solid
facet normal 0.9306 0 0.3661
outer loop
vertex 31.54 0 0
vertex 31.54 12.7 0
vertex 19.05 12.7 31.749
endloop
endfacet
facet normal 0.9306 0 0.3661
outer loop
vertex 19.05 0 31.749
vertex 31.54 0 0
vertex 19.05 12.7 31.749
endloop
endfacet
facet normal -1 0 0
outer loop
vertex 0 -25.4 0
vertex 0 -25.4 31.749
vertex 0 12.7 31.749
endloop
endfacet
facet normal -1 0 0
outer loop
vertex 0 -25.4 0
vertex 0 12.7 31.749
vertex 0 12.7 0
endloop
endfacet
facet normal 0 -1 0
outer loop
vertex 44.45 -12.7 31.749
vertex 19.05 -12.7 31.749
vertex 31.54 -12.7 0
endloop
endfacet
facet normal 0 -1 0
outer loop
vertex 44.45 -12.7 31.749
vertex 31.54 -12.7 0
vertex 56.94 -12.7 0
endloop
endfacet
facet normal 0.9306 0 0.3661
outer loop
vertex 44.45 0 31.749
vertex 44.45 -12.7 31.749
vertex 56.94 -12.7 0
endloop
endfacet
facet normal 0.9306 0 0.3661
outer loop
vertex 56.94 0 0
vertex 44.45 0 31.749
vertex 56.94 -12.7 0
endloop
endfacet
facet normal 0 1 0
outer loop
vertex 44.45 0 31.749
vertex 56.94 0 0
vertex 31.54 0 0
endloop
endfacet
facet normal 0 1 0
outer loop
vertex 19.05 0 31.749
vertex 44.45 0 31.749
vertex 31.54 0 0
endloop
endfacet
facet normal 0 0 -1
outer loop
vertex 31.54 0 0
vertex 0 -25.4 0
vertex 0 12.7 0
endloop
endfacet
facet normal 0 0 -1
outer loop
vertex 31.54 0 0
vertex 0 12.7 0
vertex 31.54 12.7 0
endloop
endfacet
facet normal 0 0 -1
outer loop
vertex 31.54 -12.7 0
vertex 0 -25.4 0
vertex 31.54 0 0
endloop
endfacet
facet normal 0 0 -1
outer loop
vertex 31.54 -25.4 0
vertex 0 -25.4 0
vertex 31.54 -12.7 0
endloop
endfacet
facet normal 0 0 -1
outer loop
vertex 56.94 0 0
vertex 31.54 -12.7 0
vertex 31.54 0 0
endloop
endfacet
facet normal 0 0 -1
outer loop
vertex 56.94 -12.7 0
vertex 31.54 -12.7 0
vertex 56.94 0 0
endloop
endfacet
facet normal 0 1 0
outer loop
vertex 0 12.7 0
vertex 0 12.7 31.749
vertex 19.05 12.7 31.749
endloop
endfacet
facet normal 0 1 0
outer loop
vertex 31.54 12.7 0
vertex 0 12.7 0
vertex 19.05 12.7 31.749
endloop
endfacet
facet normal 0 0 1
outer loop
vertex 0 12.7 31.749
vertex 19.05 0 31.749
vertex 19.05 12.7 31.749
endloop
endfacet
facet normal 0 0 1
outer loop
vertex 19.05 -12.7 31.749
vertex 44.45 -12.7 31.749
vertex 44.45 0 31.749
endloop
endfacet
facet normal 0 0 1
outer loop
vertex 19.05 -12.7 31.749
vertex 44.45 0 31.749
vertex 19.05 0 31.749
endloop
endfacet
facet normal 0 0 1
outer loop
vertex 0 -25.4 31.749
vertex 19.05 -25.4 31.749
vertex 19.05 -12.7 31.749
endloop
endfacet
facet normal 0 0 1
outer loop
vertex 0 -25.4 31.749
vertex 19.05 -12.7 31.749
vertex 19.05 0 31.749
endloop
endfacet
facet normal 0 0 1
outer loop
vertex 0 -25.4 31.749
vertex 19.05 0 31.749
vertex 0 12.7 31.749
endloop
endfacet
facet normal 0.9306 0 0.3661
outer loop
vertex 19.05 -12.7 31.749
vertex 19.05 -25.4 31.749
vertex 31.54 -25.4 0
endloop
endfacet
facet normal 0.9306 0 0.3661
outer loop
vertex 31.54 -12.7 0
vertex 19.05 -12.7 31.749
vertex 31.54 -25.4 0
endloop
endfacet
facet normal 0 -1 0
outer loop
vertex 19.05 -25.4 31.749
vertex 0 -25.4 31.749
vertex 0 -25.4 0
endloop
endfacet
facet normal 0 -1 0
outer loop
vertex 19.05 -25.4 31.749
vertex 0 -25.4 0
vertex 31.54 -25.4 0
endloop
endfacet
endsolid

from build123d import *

# Parameters (mm, degrees)
F1_DEPTH = 25.4
F3_DEPTH = 38.1
F5_DEPTH = 12.7
F6_DEPTH = 12.7
F8_DEPTH = 12.7


# Not quite as in the source:
# - a length typed as a fraction of an inch, garbled in the dataset ("3 / 203.2 mm" for 3/8 in), is restored


with BuildPart() as f1:
    # F0 (on Front) → F1 (new body)
    with BuildSketch(Plane.XZ):
        Polygon((57.15, 31.7493037554), (0, 31.7493037554), (0, 0), (56.9397357658, 0), align=None)
    extrude(amount=F1_DEPTH)

    # F2 (on face) → F3 (cut)
    with BuildSketch(Plane.XZ.offset(25.4)):
        Polygon((44.45, 31.7493037554), (56.9397357658, 0), (57.15, 31.7493037554), align=None)
    extrude(amount=-F3_DEPTH, mode=Mode.SUBTRACT)

    # F4 (on face) → F5 (cut)
    with BuildSketch(Plane.XZ.offset(25.4)):
        Polygon((44.45, 31.7493037554), (19.05, 31.7493037554), (31.5397357658, 0), (56.9397357658, 0), align=None)
    extrude(amount=-F5_DEPTH, mode=Mode.SUBTRACT)

    # F6 (add): a face of the model
    f6_faces = [f1.faces().sort_by_distance(p)[0] for p in [
        (25.4756467057, 0, 15.2228100654),
    ]]
    extrude(f6_faces, amount=F6_DEPTH)

    # F7 (on face) → F8 (cut)
    with BuildSketch(Plane(origin=(0, 12.7, 0), x_dir=(-1, 0, 0), z_dir=(0, 1, 0))):
        Polygon((-56.9397357658, 0), (-31.5397357658, 0), (-19.05, 31.7493037554), (-44.45, 31.7493037554), align=None)
    extrude(amount=-F8_DEPTH, mode=Mode.SUBTRACT)


solid = f1.part
